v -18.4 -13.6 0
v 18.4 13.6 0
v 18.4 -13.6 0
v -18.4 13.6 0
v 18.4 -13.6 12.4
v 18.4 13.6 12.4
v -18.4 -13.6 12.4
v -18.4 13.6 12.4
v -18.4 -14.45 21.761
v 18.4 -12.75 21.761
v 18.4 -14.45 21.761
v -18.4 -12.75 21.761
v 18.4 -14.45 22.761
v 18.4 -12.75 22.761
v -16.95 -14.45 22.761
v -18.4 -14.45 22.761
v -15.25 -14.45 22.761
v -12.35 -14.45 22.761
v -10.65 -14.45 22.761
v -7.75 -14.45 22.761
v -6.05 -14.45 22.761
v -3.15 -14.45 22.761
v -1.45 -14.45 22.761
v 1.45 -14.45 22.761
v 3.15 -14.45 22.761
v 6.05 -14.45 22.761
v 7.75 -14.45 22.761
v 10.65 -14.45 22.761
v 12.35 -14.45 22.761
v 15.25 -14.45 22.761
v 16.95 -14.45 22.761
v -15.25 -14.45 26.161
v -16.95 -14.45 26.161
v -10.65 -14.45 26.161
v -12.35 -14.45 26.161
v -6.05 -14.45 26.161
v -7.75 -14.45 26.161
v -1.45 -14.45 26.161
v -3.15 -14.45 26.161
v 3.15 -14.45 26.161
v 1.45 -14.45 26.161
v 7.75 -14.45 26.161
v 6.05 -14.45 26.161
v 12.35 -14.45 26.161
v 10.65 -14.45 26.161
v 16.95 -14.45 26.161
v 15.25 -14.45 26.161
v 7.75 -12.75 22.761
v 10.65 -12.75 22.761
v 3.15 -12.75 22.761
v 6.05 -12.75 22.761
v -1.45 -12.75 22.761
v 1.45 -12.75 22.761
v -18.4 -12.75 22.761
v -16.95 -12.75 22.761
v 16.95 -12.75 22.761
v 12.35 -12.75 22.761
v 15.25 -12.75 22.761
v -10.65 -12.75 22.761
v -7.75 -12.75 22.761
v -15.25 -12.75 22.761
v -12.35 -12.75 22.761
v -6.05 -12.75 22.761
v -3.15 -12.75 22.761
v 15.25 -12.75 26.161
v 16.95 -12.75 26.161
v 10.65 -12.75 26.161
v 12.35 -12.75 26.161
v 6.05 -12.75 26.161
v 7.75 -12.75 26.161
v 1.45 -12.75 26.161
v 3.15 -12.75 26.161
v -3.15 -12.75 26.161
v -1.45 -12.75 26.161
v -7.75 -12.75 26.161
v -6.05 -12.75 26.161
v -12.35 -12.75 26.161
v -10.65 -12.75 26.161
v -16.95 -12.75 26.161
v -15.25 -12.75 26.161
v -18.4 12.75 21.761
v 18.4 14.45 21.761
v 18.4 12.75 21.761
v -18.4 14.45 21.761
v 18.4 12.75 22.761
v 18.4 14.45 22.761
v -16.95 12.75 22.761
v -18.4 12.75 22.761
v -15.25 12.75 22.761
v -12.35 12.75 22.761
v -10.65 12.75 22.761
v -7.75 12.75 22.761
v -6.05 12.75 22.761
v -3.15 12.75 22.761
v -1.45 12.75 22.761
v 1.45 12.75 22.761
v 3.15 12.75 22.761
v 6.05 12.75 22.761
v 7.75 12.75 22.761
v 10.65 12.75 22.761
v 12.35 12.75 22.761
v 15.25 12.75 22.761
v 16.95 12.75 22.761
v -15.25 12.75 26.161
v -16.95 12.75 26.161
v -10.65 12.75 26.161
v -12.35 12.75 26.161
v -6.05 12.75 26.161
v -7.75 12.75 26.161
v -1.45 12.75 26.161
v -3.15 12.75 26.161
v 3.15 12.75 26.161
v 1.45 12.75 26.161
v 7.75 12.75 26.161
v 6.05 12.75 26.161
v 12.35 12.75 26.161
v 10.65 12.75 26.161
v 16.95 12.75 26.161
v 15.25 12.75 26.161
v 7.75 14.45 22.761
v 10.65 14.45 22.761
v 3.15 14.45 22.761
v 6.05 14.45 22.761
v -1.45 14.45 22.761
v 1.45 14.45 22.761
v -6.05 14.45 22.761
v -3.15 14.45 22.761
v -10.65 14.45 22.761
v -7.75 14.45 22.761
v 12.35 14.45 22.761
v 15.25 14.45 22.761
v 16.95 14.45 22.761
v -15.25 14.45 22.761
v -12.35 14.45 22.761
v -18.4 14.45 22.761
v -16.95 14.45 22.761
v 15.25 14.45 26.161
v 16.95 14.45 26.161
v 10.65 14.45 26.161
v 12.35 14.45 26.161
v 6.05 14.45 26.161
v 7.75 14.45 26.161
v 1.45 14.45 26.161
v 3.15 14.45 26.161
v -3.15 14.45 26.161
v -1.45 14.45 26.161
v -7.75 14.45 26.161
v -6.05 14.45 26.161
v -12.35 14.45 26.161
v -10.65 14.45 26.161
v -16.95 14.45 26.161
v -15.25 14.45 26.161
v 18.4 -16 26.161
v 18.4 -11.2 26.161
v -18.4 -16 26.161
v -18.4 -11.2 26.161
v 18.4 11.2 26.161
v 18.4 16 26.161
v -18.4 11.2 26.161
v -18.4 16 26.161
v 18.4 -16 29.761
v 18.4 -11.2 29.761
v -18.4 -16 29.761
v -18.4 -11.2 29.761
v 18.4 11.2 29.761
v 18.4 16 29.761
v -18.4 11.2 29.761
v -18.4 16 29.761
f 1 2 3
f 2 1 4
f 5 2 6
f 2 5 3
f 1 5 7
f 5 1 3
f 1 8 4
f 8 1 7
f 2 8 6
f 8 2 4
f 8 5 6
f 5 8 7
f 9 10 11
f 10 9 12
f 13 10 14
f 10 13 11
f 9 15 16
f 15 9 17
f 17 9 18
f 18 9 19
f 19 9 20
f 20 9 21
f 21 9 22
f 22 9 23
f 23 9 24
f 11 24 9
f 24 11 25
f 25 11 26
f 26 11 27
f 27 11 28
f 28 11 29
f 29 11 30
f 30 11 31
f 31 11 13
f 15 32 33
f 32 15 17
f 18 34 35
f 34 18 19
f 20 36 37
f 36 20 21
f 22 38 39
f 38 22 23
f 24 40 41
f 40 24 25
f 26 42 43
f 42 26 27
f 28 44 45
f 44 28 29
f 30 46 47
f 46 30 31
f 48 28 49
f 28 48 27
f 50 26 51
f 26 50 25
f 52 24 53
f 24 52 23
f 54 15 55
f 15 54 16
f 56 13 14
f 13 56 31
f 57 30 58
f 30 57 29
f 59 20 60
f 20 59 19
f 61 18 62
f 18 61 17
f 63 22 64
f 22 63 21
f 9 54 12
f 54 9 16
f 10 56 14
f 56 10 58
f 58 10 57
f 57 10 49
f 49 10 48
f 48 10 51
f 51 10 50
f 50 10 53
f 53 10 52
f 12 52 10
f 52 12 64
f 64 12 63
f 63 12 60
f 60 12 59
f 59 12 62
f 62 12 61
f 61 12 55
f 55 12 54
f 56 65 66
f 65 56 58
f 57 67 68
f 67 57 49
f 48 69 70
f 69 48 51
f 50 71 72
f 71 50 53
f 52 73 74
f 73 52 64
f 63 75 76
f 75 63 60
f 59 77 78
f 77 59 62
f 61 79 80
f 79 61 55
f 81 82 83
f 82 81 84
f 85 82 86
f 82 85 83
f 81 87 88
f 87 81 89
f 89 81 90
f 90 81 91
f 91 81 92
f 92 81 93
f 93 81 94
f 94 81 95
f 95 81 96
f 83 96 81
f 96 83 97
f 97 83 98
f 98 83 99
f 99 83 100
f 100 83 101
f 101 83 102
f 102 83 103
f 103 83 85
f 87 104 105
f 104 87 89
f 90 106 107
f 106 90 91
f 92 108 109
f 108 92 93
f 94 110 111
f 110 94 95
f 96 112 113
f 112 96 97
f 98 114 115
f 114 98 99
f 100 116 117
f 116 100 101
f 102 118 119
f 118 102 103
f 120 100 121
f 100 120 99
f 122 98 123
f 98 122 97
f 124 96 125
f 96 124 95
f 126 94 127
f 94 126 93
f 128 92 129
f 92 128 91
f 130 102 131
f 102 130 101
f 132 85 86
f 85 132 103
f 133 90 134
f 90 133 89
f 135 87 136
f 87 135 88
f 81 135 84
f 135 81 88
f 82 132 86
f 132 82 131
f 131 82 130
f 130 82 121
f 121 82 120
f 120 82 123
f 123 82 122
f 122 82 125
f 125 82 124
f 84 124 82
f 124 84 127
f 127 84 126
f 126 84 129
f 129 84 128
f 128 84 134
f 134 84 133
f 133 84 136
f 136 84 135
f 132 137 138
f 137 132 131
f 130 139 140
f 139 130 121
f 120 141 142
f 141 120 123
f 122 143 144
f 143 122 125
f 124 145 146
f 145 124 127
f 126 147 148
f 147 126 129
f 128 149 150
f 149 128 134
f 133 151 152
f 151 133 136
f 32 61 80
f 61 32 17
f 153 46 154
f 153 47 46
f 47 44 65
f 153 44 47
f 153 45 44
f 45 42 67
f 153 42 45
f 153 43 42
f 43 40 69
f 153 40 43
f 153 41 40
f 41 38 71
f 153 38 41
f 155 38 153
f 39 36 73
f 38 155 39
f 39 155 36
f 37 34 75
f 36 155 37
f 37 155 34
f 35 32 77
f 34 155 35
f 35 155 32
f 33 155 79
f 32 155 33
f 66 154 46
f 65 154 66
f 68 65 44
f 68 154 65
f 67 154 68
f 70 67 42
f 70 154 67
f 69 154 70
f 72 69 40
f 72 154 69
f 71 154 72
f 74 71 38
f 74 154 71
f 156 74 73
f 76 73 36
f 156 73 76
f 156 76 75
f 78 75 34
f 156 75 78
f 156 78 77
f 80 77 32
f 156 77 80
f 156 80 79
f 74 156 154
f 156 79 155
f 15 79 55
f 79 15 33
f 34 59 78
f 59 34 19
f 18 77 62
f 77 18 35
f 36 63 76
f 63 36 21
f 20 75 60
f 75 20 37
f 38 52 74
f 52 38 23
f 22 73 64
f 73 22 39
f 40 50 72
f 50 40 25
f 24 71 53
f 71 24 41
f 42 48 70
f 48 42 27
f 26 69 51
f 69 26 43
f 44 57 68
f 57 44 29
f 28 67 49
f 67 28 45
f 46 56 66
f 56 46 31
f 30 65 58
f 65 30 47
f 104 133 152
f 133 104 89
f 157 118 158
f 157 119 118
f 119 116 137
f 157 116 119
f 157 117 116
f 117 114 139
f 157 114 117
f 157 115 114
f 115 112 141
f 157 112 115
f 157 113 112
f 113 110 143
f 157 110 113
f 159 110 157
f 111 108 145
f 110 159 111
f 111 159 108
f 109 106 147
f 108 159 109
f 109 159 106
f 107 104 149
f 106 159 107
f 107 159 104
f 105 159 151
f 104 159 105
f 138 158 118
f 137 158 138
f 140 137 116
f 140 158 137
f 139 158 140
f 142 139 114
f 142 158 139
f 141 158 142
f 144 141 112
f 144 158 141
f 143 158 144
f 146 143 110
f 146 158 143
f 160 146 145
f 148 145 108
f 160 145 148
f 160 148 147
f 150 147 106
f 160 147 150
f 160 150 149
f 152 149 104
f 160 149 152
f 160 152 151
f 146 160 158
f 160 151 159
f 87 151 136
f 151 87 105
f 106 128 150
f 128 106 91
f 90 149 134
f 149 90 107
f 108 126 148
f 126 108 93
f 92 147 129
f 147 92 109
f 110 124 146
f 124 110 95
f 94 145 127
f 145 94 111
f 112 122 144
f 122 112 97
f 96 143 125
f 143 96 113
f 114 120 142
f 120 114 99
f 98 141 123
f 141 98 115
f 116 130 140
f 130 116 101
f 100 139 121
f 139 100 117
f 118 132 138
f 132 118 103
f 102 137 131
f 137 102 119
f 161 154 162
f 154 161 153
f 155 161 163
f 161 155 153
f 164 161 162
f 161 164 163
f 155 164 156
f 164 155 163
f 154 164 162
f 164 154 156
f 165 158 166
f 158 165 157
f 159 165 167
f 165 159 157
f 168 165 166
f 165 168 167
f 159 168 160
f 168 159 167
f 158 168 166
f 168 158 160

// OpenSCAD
// Generated by SolidPython 0.4.2 on 2020-09-29 23:20:56
//!OpenSCAD

scale(v = 0.0100000000) {
	translate(v = [-1840, -1360, 0]) {
		union() {
			color(c = [0.4000000000, 0.4000000000, 0.4000000000]) {
				translate(v = [0, 0, 0]) {
					linear_extrude(height = 1000.0000000000) {
						polygon(paths = [[0, 1, 2, 3]], points = [[0, 0], [0, 2720], [3680, 2720], [3680, 0]]);
					}
				}
			}
			color(c = [0.2000000000, 0.6000000000, 0.2000000000]) {
				translate(v = [0, 0, 1000.0000000000]) {
					linear_extrude(height = 120.0000000000) {
						polygon(paths = [[0, 1, 2, 3]], points = [[0, 1305], [0, 2720], [3680, 2720], [3680, 1305]]);
					}
				}
			}
			color(c = [0.4000000000, 0.4000000000, 0.4000000000]) {
				translate(v = [0, 0, 1000.0000000000]) {
					linear_extrude(height = 120.0000000000) {
						polygon(paths = [[0, 1, 2, 3]], points = [[0, 0], [0, 1305], [3680, 1305], [3680, 0]]);
					}
				}
			}
			color(c = [0.2000000000, 0.6000000000, 0.2000000000]) {
				translate(v = [0, 0, 1120.0000000000]) {
					linear_extrude(height = 120.0000000000) {
						polygon(paths = [[0, 1, 2, 3]], points = [[0, 1305], [0, 2720], [3680, 2720], [3680, 1305]]);
					}
				}
			}
			color(c = [0.4000000000, 0.4000000000, 0.4000000000]) {
				translate(v = [0, 0, 1120.0000000000]) {
					linear_extrude(height = 120.0000000000) {
						polygon(paths = [[0, 1, 2, 3]], points = [[0, 0], [0, 1305], [3680, 1305], [3680, 0]]);
					}
				}
			}
			color(c = [0.9000000000, 0.6000000000, 0.6000000000]) {
				translate(v = [0, 0, 2176.1000000000]) {
					linear_extrude(height = 100.0000000000) {
						polygon(paths = [[0, 1, 2, 3]], points = [[0, -85], [0, 85], [3680, 85], [3680, -85]]);
					}
				}
			}
			color(c = [0.9000000000, 0.6000000000, 0.6000000000]) {
				translate(v = [0, 0, 2176.1000000000]) {
					linear_extrude(height = 100.0000000000) {
						polygon(paths = [[0, 1, 2, 3]], points = [[0, 2635], [0, 2805], [3680, 2805], [3680, 2635]]);
					}
				}
			}
			color(c = [0.5000000000, 0.5000000000, 0.5000000000]) {
				translate(v = [0, 0, 2276.1000000000]) {
					linear_extrude(height = 340.0000000000) {
						polygon(paths = [[0, 1, 2, 3]], points = [[145, -85], [145, 85], [315, 85], [315, -85]]);
					}
				}
			}
			color(c = [0.5000000000, 0.5000000000, 0.5000000000]) {
				translate(v = [0, 0, 2276.1000000000]) {
					linear_extrude(height = 340.0000000000) {
						polygon(paths = [[0, 1, 2, 3]], points = [[605, -85], [605, 85], [775, 85], [775, -85]]);
					}
				}
			}
			color(c = [0.5000000000, 0.5000000000, 0.5000000000]) {
				translate(v = [0, 0, 2276.1000000000]) {
					linear_extrude(height = 340.0000000000) {
						polygon(paths = [[0, 1, 2, 3]], points = [[1065, -85], [1065, 85], [1235, 85], [1235, -85]]);
					}
				}
			}
			color(c = [0.5000000000, 0.5000000000, 0.5000000000]) {
				translate(v = [0, 0, 2276.1000000000]) {
					linear_extrude(height = 340.0000000000) {
						polygon(paths = [[0, 1, 2, 3]], points = [[1525, -85], [1525, 85], [1695, 85], [1695, -85]]);
					}
				}
			}
			color(c = [0.5000000000, 0.5000000000, 0.5000000000]) {
				translate(v = [0, 0, 2276.1000000000]) {
					linear_extrude(height = 340.0000000000) {
						polygon(paths = [[0, 1, 2, 3]], points = [[1985, -85], [1985, 85], [2155, 85], [2155, -85]]);
					}
				}
			}
			color(c = [0.5000000000, 0.5000000000, 0.5000000000]) {
				translate(v = [0, 0, 2276.1000000000]) {
					linear_extrude(height = 340.0000000000) {
						polygon(paths = [[0, 1, 2, 3]], points = [[2445, -85], [2445, 85], [2615, 85], [2615, -85]]);
					}
				}
			}
			color(c = [0.5000000000, 0.5000000000, 0.5000000000]) {
				translate(v = [0, 0, 2276.1000000000]) {
					linear_extrude(height = 340.0000000000) {
						polygon(paths = [[0, 1, 2, 3]], points = [[2905, -85], [2905, 85], [3075, 85], [3075, -85]]);
					}
				}
			}
			color(c = [0.5000000000, 0.5000000000, 0.5000000000]) {
				translate(v = [0, 0, 2276.1000000000]) {
					linear_extrude(height = 340.0000000000) {
						polygon(paths = [[0, 1, 2, 3]], points = [[3365, -85], [3365, 85], [3535, 85], [3535, -85]]);
					}
				}
			}
			color(c = [0.5000000000, 0.5000000000, 0.5000000000]) {
				translate(v = [0, 0, 2276.1000000000]) {
					linear_extrude(height = 340.0000000000) {
						polygon(paths = [[0, 1, 2, 3]], points = [[145, 2635], [145, 2805], [315, 2805], [315, 2635]]);
					}
				}
			}
			color(c = [0.5000000000, 0.5000000000, 0.5000000000]) {
				translate(v = [0, 0, 2276.1000000000]) {
					linear_extrude(height = 340.0000000000) {
						polygon(paths = [[0, 1, 2, 3]], points = [[605, 2635], [605, 2805], [775, 2805], [775, 2635]]);
					}
				}
			}
			color(c = [0.5000000000, 0.5000000000, 0.5000000000]) {
				translate(v = [0, 0, 2276.1000000000]) {
					linear_extrude(height = 340.0000000000) {
						polygon(paths = [[0, 1, 2, 3]], points = [[1065, 2635], [1065, 2805], [1235, 2805], [1235, 2635]]);
					}
				}
			}
			color(c = [0.5000000000, 0.5000000000, 0.5000000000]) {
				translate(v = [0, 0, 2276.1000000000]) {
					linear_extrude(height = 340.0000000000) {
						polygon(paths = [[0, 1, 2, 3]], points = [[1525, 2635], [1525, 2805], [1695, 2805], [1695, 2635]]);
					}
				}
			}
			color(c = [0.5000000000, 0.5000000000, 0.5000000000]) {
				translate(v = [0, 0, 2276.1000000000]) {
					linear_extrude(height = 340.0000000000) {
						polygon(paths = [[0, 1, 2, 3]], points = [[1985, 2635], [1985, 2805], [2155, 2805], [2155, 2635]]);
					}
				}
			}
			color(c = [0.5000000000, 0.5000000000, 0.5000000000]) {
				translate(v = [0, 0, 2276.1000000000]) {
					linear_extrude(height = 340.0000000000) {
						polygon(paths = [[0, 1, 2, 3]], points = [[2445, 2635], [2445, 2805], [2615, 2805], [2615, 2635]]);
					}
				}
			}
			color(c = [0.5000000000, 0.5000000000, 0.5000000000]) {
				translate(v = [0, 0, 2276.1000000000]) {
					linear_extrude(height = 340.0000000000) {
						polygon(paths = [[0, 1, 2, 3]], points = [[2905, 2635], [2905, 2805], [3075, 2805], [3075, 2635]]);
					}
				}
			}
			color(c = [0.5000000000, 0.5000000000, 0.5000000000]) {
				translate(v = [0, 0, 2276.1000000000]) {
					linear_extrude(height = 340.0000000000) {
						polygon(paths = [[0, 1, 2, 3]], points = [[3365, 2635], [3365, 2805], [3535, 2805], [3535, 2635]]);
					}
				}
			}
			color(c = [0.3000000000, 0.3000000000, 1]) {
				translate(v = [0, 0, 2616.1000000000]) {
					linear_extrude(height = 360.0000000000) {
						polygon(paths = [[0, 1, 2, 3]], points = [[0, -240], [0, 240], [3680, 240], [3680, -240]]);
					}
				}
			}
			color(c = [0.3000000000, 0.3000000000, 1]) {
				translate(v = [0, 0, 2616.1000000000]) {
					linear_extrude(height = 360.0000000000) {
						polygon(paths = [[0, 1, 2, 3]], points = [[0, 2480], [0, 2960], [3680, 2960], [3680, 2480]]);
					}
				}
			}
		}
	}
}
